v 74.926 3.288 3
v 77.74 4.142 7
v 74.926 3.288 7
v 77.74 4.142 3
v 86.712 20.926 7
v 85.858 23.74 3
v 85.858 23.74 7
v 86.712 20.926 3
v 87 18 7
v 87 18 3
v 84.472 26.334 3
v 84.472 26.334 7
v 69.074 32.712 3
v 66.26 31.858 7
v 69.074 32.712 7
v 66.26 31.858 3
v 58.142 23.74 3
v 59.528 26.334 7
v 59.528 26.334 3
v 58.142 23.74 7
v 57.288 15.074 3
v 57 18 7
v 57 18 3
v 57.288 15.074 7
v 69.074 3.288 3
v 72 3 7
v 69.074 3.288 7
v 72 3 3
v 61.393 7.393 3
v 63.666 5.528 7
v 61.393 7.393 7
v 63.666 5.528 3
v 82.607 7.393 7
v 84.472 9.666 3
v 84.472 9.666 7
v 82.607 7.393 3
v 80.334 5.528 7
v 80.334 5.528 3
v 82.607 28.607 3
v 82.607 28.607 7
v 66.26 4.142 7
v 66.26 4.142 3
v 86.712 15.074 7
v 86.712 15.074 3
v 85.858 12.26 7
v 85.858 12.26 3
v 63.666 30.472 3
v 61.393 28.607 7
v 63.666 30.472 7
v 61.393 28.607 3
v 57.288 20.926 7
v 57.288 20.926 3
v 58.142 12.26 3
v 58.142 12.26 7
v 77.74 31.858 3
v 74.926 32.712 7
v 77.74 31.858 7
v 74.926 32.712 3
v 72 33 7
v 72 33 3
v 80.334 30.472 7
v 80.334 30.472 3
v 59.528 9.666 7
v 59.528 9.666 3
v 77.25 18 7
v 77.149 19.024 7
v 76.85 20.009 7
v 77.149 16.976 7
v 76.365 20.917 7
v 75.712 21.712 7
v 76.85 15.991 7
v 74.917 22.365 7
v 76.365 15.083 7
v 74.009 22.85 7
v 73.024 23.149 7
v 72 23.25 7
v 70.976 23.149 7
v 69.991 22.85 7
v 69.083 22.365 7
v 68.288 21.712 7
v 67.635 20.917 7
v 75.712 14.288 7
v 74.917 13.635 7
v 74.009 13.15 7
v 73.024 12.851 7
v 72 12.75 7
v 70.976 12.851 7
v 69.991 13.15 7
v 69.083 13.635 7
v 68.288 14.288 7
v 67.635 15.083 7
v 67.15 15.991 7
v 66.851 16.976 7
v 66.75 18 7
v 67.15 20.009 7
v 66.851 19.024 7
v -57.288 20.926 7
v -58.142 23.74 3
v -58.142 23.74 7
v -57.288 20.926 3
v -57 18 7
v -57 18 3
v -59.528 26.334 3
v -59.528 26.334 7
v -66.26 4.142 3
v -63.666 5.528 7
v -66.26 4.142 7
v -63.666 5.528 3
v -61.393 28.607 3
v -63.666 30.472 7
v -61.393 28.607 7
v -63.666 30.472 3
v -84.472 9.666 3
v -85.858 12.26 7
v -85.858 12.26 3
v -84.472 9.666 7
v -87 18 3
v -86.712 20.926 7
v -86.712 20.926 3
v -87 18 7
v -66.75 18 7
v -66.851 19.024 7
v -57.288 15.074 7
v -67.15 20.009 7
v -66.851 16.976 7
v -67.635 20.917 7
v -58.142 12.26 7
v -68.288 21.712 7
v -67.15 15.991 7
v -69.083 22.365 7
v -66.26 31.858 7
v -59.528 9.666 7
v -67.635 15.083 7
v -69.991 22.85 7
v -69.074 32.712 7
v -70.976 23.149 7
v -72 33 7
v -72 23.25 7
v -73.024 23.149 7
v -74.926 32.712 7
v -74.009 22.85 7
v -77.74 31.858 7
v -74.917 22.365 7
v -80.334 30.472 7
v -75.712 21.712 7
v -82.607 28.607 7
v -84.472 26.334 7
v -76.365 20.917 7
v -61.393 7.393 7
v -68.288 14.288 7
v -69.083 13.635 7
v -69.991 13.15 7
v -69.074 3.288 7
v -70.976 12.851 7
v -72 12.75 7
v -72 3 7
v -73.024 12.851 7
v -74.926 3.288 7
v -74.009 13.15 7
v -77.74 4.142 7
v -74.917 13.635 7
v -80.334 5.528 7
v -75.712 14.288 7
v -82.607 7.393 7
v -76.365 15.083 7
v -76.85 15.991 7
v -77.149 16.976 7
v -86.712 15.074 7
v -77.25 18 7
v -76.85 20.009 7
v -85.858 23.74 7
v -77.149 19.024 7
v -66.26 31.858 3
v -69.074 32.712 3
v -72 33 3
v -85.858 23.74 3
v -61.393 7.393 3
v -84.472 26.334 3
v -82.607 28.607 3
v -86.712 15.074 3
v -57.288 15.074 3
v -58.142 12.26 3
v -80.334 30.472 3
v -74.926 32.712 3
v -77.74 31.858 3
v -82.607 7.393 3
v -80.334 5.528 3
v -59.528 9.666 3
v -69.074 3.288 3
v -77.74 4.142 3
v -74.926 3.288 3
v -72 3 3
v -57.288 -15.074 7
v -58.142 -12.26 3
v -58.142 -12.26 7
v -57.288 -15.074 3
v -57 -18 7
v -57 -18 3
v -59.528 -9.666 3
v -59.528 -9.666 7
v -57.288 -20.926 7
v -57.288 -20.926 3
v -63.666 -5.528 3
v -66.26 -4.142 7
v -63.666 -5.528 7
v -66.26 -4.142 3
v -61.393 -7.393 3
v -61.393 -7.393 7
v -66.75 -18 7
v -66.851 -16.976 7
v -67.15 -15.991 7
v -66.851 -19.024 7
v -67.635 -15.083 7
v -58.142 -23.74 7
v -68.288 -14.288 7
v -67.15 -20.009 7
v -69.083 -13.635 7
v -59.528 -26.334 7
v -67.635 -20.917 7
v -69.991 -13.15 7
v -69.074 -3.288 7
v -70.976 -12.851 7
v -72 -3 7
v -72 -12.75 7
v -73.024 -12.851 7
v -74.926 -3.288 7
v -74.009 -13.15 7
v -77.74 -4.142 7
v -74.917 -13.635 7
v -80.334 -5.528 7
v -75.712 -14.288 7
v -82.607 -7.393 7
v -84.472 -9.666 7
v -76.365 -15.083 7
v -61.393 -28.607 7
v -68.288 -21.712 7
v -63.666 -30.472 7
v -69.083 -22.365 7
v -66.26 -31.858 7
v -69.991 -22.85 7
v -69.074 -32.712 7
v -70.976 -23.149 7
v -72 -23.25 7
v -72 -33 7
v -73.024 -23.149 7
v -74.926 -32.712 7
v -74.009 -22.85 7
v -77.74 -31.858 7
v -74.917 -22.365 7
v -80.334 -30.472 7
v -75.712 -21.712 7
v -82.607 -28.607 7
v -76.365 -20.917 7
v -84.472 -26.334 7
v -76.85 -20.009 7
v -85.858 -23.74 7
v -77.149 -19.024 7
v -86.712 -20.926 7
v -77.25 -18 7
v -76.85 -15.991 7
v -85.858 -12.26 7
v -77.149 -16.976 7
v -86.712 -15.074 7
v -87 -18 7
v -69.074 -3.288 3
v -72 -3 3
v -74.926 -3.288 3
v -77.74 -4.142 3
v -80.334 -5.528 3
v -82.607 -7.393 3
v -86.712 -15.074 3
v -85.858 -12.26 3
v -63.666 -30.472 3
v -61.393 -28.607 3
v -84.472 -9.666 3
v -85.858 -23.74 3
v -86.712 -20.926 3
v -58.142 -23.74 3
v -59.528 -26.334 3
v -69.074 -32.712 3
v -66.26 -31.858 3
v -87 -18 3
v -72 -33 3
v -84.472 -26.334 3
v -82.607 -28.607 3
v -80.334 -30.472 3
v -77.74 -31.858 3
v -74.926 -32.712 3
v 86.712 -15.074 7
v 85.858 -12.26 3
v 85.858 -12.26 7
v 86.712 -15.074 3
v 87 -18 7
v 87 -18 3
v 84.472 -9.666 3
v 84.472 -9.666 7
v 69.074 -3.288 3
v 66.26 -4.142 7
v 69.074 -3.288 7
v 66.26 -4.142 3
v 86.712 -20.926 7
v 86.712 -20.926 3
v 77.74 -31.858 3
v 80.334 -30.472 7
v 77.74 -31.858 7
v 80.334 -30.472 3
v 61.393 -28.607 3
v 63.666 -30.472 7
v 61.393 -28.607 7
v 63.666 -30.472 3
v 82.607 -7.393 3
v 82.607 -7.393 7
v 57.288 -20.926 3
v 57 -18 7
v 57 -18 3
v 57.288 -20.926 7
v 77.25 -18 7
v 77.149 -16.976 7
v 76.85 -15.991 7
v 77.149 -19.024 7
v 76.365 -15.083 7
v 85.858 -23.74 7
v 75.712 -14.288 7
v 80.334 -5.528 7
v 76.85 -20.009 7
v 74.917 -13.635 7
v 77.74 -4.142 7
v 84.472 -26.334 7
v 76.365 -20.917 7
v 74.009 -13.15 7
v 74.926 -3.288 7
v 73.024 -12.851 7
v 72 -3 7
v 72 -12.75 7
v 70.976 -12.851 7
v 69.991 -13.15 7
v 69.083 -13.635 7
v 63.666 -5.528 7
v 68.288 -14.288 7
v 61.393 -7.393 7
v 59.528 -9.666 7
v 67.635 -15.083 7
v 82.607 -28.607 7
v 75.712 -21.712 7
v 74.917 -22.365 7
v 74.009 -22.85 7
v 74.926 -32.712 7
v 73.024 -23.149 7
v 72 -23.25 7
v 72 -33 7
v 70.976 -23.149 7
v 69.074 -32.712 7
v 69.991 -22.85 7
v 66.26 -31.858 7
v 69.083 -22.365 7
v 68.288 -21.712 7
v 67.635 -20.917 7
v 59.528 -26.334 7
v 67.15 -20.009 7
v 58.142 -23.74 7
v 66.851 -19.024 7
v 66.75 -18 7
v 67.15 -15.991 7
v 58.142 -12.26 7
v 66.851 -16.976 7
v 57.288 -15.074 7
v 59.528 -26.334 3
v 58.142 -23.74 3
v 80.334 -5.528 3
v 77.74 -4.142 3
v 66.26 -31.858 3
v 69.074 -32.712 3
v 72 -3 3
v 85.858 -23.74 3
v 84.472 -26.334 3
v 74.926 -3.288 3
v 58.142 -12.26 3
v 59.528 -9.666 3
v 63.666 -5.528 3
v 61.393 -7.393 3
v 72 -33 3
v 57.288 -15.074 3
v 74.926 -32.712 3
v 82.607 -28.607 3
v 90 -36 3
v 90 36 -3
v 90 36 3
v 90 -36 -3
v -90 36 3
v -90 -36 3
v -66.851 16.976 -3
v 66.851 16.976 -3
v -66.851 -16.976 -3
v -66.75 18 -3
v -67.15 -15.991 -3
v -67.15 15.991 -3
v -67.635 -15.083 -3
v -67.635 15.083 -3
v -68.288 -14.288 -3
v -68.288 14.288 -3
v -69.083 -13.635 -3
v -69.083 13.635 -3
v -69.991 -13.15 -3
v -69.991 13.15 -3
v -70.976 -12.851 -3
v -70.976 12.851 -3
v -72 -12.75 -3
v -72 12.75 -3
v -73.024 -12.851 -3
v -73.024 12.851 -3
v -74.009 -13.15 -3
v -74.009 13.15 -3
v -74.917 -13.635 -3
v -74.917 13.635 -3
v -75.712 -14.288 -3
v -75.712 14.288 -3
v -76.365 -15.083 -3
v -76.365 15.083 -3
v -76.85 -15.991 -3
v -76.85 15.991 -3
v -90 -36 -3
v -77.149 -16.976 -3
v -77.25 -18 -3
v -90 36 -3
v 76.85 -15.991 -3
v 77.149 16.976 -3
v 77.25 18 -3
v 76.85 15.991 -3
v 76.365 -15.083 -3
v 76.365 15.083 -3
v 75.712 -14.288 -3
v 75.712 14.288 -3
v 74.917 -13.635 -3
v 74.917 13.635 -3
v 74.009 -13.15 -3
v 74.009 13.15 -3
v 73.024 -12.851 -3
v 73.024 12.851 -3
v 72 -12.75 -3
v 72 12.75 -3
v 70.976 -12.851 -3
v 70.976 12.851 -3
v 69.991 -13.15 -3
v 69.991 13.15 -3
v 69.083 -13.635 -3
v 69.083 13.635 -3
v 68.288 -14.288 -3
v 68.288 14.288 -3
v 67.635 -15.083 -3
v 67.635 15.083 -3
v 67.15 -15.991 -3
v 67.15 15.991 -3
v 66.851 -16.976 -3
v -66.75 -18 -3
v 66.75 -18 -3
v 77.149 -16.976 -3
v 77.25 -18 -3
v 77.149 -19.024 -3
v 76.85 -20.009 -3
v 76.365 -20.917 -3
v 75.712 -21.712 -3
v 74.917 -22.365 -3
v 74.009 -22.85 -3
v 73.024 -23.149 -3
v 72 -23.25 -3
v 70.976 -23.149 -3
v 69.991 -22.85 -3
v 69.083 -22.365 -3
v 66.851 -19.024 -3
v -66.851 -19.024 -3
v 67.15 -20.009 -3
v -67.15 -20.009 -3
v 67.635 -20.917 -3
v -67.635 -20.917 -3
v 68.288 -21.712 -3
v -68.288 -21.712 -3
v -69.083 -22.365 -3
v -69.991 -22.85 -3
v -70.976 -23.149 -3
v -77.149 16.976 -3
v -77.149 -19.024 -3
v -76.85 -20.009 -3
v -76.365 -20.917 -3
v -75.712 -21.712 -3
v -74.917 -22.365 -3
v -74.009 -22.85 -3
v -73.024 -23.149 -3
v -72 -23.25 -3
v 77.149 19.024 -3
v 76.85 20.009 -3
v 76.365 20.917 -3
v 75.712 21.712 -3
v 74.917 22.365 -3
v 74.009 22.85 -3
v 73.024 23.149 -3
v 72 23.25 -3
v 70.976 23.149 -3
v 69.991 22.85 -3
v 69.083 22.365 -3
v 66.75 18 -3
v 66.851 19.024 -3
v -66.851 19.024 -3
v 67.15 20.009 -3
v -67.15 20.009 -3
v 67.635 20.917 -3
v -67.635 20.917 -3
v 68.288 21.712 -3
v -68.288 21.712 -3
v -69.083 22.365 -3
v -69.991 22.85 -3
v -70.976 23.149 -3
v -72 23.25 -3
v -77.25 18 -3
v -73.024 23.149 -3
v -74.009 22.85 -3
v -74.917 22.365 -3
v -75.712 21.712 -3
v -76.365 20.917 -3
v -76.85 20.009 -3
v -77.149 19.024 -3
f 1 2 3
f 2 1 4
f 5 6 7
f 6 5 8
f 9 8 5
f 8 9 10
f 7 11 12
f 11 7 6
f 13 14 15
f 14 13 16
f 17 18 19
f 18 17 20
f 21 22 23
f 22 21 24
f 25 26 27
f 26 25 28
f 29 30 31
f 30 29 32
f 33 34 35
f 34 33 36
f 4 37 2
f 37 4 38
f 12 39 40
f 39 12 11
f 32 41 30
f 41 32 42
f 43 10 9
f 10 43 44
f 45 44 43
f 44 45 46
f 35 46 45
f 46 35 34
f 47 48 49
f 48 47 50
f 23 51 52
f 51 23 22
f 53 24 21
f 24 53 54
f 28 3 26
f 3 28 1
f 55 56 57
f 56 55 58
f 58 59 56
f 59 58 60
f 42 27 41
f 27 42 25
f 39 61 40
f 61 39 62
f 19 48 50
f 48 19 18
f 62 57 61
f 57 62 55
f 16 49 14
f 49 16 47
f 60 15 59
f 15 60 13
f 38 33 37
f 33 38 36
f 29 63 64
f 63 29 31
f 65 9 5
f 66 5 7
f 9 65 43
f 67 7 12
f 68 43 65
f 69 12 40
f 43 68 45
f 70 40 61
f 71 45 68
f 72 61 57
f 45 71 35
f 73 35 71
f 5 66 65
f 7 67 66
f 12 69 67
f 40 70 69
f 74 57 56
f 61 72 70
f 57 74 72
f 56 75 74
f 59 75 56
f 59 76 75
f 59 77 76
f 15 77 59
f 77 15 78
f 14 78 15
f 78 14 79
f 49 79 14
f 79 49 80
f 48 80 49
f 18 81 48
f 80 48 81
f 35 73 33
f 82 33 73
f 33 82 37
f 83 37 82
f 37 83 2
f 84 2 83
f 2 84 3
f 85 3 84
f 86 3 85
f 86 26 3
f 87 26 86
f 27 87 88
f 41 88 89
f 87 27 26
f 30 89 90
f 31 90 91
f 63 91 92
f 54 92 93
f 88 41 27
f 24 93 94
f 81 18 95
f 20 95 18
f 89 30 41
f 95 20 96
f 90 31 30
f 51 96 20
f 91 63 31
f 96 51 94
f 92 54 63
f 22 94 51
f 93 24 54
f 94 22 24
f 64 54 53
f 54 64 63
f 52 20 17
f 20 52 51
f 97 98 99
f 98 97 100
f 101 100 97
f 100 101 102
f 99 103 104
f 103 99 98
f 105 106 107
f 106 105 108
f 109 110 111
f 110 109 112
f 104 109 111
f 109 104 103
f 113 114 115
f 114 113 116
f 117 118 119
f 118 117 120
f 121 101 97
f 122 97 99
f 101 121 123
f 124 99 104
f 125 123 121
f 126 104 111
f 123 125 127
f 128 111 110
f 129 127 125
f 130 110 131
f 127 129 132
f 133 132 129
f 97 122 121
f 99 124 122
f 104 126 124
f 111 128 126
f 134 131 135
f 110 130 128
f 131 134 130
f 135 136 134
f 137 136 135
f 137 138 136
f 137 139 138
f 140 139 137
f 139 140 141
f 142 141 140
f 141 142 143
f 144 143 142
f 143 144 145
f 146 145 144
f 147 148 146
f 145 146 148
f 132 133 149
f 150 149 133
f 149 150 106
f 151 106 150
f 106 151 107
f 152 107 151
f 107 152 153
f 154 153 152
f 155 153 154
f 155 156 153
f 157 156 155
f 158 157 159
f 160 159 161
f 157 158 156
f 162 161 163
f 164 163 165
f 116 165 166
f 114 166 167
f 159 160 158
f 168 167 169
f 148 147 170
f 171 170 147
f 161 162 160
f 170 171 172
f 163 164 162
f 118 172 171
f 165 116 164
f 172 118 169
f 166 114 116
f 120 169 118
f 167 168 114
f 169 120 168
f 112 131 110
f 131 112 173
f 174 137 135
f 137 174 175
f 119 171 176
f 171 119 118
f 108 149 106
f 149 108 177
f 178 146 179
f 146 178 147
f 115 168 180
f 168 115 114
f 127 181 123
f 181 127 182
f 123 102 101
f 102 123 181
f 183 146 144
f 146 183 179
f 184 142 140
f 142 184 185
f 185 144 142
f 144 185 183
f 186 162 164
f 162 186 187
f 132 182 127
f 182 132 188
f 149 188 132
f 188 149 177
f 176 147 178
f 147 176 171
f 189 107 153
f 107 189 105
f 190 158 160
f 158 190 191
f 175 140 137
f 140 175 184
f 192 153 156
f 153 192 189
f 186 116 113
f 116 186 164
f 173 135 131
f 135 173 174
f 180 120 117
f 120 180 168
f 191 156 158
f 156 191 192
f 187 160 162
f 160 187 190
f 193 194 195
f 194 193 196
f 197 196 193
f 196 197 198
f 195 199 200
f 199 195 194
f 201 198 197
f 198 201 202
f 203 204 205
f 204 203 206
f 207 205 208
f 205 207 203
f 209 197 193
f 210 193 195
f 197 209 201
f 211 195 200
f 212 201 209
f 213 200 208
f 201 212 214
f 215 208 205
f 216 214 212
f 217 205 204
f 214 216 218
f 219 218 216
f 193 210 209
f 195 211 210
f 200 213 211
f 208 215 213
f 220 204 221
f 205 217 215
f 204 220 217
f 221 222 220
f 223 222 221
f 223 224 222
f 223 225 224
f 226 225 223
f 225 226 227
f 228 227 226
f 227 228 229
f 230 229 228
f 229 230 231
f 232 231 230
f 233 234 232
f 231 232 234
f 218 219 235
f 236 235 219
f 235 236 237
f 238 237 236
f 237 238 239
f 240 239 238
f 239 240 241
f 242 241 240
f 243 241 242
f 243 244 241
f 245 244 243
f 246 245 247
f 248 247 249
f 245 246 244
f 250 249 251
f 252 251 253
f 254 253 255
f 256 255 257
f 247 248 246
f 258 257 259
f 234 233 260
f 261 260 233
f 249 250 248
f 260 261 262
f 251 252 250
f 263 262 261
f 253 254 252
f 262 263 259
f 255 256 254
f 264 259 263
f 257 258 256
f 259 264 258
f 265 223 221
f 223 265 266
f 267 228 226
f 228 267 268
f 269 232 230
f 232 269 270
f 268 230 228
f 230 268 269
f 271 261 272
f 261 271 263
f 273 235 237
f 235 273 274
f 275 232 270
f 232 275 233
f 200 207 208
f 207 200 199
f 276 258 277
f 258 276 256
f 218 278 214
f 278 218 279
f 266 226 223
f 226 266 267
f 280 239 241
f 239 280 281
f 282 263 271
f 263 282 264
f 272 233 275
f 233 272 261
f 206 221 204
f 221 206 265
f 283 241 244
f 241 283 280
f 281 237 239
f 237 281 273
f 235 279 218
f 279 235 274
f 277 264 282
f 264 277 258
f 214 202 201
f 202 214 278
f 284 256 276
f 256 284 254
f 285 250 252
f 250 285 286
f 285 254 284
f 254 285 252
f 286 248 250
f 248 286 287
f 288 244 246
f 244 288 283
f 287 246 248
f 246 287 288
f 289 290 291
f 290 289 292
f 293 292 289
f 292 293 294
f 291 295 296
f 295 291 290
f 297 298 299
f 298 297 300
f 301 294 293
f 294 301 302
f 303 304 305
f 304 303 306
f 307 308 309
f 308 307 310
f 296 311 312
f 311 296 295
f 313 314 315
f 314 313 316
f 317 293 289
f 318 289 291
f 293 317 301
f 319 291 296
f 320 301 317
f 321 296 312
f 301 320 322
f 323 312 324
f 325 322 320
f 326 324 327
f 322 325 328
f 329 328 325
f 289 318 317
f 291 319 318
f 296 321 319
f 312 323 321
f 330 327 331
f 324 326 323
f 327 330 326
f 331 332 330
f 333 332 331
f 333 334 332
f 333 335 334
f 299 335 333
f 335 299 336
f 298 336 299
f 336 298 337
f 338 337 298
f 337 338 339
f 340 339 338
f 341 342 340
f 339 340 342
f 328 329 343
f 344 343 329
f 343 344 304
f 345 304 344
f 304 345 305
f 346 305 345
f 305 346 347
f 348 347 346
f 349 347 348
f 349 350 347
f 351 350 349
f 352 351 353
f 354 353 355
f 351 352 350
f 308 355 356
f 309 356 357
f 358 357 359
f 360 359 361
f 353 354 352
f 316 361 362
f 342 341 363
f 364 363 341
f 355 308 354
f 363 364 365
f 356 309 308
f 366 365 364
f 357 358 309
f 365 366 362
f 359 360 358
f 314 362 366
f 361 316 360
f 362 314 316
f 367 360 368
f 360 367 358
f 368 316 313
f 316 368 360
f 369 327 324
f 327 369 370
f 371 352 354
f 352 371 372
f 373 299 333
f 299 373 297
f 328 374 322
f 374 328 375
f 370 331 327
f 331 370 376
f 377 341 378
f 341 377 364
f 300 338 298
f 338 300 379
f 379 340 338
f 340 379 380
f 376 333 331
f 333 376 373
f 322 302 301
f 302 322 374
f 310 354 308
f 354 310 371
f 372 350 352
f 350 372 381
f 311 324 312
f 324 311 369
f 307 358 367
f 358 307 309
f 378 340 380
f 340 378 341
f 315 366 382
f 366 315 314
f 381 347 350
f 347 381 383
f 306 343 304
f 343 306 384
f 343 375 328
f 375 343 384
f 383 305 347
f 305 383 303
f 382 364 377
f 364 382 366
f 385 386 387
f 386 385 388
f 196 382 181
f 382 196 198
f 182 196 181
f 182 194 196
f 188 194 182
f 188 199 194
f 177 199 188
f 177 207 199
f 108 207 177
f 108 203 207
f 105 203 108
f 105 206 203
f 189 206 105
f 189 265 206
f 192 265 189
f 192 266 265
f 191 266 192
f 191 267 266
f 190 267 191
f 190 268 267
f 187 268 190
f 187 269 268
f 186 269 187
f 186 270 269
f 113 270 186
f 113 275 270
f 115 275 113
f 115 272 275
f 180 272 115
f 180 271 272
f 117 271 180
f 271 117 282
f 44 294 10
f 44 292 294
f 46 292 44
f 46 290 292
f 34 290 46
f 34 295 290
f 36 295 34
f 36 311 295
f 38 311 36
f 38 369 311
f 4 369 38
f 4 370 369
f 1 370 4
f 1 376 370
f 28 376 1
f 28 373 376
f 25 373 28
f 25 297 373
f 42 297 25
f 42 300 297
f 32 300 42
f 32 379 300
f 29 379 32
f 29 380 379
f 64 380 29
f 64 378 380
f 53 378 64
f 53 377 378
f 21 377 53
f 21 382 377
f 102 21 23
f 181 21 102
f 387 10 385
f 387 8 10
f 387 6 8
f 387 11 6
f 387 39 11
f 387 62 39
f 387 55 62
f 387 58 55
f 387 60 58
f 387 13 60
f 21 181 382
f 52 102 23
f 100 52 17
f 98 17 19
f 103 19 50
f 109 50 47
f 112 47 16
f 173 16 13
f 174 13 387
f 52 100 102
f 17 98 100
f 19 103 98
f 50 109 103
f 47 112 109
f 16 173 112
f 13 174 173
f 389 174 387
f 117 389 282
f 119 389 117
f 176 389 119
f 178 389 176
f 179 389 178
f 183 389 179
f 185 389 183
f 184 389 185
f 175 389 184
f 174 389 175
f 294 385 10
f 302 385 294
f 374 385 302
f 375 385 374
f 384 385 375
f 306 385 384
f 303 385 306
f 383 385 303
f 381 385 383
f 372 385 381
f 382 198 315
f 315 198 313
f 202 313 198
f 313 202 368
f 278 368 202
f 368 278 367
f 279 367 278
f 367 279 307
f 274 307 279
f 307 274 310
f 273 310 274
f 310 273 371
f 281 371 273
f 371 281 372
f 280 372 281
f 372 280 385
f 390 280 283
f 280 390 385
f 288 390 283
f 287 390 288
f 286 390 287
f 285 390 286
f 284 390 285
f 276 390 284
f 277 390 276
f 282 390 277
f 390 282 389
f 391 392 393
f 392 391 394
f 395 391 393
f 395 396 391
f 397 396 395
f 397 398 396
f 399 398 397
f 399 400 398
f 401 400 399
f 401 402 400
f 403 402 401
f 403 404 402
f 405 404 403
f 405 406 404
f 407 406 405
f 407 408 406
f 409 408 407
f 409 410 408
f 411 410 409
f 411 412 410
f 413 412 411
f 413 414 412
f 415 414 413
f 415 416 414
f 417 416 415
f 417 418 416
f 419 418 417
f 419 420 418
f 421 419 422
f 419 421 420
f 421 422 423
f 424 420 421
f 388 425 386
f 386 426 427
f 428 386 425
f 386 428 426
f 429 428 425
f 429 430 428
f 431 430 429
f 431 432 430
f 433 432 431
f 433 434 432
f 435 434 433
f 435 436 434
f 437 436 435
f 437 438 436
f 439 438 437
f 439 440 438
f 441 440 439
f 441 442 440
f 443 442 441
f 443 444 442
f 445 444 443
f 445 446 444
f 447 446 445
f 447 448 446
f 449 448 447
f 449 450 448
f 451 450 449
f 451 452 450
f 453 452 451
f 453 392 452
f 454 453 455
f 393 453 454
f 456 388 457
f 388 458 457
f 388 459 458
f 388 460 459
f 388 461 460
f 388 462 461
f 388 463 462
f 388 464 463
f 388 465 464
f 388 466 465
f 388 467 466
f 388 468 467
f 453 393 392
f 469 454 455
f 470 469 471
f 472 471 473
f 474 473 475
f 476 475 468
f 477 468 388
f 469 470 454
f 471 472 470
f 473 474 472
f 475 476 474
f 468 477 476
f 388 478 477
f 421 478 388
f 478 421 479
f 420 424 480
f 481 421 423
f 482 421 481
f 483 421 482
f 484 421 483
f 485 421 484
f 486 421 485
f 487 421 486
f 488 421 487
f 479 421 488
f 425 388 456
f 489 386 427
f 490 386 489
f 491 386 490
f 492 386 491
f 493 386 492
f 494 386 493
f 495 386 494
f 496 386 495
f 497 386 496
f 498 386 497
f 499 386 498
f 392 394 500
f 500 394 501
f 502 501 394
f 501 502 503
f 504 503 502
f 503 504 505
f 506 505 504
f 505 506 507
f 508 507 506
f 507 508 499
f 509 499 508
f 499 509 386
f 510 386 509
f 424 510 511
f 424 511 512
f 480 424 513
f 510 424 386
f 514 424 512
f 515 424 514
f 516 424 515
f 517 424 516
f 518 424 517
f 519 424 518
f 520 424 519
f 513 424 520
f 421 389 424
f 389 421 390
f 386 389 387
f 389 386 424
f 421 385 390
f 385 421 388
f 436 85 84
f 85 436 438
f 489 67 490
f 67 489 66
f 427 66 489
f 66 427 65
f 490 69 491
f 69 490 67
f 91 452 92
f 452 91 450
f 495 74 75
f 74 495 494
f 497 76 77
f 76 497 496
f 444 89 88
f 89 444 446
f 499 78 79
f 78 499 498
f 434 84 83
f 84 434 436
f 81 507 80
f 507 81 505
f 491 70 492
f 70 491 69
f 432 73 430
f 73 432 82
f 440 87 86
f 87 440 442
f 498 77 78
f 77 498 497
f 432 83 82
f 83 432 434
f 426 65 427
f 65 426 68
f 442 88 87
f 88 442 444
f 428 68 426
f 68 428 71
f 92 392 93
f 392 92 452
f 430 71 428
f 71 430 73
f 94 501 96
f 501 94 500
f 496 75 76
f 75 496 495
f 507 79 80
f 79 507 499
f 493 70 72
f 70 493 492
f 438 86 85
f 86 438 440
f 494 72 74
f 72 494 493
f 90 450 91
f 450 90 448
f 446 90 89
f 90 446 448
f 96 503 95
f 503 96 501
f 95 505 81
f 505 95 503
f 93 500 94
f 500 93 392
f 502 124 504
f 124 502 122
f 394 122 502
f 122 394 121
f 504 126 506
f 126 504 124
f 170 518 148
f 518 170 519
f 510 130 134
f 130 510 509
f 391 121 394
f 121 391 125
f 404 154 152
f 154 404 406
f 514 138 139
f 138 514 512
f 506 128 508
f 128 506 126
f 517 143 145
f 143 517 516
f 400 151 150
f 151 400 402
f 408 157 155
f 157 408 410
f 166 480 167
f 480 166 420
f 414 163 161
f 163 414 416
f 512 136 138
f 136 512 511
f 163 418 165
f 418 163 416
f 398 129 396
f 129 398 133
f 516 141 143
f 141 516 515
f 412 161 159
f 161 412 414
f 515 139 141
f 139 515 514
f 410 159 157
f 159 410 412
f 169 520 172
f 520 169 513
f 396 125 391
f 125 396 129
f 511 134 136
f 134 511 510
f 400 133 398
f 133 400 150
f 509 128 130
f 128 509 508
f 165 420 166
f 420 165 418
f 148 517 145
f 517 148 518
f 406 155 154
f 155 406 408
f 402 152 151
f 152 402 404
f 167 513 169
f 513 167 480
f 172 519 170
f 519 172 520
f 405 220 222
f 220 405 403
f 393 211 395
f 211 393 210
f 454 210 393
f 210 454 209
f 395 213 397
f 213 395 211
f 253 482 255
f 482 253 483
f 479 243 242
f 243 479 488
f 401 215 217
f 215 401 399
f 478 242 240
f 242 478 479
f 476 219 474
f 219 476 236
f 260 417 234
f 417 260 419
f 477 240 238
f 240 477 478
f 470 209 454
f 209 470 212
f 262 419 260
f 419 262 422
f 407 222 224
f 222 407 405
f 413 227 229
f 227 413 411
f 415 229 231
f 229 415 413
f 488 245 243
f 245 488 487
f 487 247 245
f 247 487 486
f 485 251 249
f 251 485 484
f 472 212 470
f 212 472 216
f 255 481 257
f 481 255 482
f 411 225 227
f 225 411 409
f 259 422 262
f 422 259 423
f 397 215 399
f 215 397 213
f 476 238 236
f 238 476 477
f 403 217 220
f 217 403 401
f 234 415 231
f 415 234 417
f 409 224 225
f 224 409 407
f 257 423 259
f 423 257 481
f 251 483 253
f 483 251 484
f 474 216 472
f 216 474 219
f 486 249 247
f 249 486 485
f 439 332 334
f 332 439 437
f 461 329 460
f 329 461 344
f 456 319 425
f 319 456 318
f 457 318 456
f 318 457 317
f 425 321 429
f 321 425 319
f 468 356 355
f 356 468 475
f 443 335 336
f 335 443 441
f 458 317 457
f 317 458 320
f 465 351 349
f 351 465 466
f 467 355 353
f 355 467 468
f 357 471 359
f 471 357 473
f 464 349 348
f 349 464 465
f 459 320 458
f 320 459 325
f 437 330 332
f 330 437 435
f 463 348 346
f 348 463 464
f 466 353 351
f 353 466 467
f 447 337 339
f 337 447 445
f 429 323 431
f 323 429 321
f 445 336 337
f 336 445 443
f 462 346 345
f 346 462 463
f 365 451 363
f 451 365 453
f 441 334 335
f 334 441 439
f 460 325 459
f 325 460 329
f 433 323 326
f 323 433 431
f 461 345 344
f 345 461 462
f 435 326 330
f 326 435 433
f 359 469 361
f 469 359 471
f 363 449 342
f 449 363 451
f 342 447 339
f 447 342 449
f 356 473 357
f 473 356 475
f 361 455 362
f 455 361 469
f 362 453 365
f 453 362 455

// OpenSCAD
$fn = 32;

// ----------------------------------------------------------------------
// Anchor pads 180 x 72 x 10
// four corner bosses with anchor holes
// ----------------------------------------------------------------------

// --- parameters (mm) ---
plate = [180, 72, 6];  // base plate size (x, y, z)
pads = 4;              // boss count, one per corner
edge = 18;             // boss centre offset from the plate edge
boss_d = 30;           // boss diameter
boss_h = 4;            // boss height above the base plate
hole_d = 10.5;         // hole diameter

// --- derived feature positions (mm) ---
height = plate[2] + boss_h;      // = 10   overall height of the part
corner_x = plate[0] / 2 - edge;  // = 72   boss centre X
corner_y = plate[1] / 2 - edge;  // = 18   boss centre Y
feature_centers = [
  [corner_x, corner_y],
  [-corner_x, corner_y],
  [-corner_x, -corner_y],
  [corner_x, -corner_y]
];   // boss centres, anchor holes are drilled there

// base plate, four bosses standing on it, anchor holes all the way through
difference() {
  union() {
    cube(plate, center = true);
    for (centre = feature_centers)
      translate([centre[0], centre[1], plate[2] / 2 - 1])
        cylinder(d = boss_d, h = boss_h + 1);
  }
  for (centre = feature_centers)
    translate([centre[0], centre[1], -height])
      cylinder(d = hole_d, h = 2 * height + 2);  // through boss and plate
}
